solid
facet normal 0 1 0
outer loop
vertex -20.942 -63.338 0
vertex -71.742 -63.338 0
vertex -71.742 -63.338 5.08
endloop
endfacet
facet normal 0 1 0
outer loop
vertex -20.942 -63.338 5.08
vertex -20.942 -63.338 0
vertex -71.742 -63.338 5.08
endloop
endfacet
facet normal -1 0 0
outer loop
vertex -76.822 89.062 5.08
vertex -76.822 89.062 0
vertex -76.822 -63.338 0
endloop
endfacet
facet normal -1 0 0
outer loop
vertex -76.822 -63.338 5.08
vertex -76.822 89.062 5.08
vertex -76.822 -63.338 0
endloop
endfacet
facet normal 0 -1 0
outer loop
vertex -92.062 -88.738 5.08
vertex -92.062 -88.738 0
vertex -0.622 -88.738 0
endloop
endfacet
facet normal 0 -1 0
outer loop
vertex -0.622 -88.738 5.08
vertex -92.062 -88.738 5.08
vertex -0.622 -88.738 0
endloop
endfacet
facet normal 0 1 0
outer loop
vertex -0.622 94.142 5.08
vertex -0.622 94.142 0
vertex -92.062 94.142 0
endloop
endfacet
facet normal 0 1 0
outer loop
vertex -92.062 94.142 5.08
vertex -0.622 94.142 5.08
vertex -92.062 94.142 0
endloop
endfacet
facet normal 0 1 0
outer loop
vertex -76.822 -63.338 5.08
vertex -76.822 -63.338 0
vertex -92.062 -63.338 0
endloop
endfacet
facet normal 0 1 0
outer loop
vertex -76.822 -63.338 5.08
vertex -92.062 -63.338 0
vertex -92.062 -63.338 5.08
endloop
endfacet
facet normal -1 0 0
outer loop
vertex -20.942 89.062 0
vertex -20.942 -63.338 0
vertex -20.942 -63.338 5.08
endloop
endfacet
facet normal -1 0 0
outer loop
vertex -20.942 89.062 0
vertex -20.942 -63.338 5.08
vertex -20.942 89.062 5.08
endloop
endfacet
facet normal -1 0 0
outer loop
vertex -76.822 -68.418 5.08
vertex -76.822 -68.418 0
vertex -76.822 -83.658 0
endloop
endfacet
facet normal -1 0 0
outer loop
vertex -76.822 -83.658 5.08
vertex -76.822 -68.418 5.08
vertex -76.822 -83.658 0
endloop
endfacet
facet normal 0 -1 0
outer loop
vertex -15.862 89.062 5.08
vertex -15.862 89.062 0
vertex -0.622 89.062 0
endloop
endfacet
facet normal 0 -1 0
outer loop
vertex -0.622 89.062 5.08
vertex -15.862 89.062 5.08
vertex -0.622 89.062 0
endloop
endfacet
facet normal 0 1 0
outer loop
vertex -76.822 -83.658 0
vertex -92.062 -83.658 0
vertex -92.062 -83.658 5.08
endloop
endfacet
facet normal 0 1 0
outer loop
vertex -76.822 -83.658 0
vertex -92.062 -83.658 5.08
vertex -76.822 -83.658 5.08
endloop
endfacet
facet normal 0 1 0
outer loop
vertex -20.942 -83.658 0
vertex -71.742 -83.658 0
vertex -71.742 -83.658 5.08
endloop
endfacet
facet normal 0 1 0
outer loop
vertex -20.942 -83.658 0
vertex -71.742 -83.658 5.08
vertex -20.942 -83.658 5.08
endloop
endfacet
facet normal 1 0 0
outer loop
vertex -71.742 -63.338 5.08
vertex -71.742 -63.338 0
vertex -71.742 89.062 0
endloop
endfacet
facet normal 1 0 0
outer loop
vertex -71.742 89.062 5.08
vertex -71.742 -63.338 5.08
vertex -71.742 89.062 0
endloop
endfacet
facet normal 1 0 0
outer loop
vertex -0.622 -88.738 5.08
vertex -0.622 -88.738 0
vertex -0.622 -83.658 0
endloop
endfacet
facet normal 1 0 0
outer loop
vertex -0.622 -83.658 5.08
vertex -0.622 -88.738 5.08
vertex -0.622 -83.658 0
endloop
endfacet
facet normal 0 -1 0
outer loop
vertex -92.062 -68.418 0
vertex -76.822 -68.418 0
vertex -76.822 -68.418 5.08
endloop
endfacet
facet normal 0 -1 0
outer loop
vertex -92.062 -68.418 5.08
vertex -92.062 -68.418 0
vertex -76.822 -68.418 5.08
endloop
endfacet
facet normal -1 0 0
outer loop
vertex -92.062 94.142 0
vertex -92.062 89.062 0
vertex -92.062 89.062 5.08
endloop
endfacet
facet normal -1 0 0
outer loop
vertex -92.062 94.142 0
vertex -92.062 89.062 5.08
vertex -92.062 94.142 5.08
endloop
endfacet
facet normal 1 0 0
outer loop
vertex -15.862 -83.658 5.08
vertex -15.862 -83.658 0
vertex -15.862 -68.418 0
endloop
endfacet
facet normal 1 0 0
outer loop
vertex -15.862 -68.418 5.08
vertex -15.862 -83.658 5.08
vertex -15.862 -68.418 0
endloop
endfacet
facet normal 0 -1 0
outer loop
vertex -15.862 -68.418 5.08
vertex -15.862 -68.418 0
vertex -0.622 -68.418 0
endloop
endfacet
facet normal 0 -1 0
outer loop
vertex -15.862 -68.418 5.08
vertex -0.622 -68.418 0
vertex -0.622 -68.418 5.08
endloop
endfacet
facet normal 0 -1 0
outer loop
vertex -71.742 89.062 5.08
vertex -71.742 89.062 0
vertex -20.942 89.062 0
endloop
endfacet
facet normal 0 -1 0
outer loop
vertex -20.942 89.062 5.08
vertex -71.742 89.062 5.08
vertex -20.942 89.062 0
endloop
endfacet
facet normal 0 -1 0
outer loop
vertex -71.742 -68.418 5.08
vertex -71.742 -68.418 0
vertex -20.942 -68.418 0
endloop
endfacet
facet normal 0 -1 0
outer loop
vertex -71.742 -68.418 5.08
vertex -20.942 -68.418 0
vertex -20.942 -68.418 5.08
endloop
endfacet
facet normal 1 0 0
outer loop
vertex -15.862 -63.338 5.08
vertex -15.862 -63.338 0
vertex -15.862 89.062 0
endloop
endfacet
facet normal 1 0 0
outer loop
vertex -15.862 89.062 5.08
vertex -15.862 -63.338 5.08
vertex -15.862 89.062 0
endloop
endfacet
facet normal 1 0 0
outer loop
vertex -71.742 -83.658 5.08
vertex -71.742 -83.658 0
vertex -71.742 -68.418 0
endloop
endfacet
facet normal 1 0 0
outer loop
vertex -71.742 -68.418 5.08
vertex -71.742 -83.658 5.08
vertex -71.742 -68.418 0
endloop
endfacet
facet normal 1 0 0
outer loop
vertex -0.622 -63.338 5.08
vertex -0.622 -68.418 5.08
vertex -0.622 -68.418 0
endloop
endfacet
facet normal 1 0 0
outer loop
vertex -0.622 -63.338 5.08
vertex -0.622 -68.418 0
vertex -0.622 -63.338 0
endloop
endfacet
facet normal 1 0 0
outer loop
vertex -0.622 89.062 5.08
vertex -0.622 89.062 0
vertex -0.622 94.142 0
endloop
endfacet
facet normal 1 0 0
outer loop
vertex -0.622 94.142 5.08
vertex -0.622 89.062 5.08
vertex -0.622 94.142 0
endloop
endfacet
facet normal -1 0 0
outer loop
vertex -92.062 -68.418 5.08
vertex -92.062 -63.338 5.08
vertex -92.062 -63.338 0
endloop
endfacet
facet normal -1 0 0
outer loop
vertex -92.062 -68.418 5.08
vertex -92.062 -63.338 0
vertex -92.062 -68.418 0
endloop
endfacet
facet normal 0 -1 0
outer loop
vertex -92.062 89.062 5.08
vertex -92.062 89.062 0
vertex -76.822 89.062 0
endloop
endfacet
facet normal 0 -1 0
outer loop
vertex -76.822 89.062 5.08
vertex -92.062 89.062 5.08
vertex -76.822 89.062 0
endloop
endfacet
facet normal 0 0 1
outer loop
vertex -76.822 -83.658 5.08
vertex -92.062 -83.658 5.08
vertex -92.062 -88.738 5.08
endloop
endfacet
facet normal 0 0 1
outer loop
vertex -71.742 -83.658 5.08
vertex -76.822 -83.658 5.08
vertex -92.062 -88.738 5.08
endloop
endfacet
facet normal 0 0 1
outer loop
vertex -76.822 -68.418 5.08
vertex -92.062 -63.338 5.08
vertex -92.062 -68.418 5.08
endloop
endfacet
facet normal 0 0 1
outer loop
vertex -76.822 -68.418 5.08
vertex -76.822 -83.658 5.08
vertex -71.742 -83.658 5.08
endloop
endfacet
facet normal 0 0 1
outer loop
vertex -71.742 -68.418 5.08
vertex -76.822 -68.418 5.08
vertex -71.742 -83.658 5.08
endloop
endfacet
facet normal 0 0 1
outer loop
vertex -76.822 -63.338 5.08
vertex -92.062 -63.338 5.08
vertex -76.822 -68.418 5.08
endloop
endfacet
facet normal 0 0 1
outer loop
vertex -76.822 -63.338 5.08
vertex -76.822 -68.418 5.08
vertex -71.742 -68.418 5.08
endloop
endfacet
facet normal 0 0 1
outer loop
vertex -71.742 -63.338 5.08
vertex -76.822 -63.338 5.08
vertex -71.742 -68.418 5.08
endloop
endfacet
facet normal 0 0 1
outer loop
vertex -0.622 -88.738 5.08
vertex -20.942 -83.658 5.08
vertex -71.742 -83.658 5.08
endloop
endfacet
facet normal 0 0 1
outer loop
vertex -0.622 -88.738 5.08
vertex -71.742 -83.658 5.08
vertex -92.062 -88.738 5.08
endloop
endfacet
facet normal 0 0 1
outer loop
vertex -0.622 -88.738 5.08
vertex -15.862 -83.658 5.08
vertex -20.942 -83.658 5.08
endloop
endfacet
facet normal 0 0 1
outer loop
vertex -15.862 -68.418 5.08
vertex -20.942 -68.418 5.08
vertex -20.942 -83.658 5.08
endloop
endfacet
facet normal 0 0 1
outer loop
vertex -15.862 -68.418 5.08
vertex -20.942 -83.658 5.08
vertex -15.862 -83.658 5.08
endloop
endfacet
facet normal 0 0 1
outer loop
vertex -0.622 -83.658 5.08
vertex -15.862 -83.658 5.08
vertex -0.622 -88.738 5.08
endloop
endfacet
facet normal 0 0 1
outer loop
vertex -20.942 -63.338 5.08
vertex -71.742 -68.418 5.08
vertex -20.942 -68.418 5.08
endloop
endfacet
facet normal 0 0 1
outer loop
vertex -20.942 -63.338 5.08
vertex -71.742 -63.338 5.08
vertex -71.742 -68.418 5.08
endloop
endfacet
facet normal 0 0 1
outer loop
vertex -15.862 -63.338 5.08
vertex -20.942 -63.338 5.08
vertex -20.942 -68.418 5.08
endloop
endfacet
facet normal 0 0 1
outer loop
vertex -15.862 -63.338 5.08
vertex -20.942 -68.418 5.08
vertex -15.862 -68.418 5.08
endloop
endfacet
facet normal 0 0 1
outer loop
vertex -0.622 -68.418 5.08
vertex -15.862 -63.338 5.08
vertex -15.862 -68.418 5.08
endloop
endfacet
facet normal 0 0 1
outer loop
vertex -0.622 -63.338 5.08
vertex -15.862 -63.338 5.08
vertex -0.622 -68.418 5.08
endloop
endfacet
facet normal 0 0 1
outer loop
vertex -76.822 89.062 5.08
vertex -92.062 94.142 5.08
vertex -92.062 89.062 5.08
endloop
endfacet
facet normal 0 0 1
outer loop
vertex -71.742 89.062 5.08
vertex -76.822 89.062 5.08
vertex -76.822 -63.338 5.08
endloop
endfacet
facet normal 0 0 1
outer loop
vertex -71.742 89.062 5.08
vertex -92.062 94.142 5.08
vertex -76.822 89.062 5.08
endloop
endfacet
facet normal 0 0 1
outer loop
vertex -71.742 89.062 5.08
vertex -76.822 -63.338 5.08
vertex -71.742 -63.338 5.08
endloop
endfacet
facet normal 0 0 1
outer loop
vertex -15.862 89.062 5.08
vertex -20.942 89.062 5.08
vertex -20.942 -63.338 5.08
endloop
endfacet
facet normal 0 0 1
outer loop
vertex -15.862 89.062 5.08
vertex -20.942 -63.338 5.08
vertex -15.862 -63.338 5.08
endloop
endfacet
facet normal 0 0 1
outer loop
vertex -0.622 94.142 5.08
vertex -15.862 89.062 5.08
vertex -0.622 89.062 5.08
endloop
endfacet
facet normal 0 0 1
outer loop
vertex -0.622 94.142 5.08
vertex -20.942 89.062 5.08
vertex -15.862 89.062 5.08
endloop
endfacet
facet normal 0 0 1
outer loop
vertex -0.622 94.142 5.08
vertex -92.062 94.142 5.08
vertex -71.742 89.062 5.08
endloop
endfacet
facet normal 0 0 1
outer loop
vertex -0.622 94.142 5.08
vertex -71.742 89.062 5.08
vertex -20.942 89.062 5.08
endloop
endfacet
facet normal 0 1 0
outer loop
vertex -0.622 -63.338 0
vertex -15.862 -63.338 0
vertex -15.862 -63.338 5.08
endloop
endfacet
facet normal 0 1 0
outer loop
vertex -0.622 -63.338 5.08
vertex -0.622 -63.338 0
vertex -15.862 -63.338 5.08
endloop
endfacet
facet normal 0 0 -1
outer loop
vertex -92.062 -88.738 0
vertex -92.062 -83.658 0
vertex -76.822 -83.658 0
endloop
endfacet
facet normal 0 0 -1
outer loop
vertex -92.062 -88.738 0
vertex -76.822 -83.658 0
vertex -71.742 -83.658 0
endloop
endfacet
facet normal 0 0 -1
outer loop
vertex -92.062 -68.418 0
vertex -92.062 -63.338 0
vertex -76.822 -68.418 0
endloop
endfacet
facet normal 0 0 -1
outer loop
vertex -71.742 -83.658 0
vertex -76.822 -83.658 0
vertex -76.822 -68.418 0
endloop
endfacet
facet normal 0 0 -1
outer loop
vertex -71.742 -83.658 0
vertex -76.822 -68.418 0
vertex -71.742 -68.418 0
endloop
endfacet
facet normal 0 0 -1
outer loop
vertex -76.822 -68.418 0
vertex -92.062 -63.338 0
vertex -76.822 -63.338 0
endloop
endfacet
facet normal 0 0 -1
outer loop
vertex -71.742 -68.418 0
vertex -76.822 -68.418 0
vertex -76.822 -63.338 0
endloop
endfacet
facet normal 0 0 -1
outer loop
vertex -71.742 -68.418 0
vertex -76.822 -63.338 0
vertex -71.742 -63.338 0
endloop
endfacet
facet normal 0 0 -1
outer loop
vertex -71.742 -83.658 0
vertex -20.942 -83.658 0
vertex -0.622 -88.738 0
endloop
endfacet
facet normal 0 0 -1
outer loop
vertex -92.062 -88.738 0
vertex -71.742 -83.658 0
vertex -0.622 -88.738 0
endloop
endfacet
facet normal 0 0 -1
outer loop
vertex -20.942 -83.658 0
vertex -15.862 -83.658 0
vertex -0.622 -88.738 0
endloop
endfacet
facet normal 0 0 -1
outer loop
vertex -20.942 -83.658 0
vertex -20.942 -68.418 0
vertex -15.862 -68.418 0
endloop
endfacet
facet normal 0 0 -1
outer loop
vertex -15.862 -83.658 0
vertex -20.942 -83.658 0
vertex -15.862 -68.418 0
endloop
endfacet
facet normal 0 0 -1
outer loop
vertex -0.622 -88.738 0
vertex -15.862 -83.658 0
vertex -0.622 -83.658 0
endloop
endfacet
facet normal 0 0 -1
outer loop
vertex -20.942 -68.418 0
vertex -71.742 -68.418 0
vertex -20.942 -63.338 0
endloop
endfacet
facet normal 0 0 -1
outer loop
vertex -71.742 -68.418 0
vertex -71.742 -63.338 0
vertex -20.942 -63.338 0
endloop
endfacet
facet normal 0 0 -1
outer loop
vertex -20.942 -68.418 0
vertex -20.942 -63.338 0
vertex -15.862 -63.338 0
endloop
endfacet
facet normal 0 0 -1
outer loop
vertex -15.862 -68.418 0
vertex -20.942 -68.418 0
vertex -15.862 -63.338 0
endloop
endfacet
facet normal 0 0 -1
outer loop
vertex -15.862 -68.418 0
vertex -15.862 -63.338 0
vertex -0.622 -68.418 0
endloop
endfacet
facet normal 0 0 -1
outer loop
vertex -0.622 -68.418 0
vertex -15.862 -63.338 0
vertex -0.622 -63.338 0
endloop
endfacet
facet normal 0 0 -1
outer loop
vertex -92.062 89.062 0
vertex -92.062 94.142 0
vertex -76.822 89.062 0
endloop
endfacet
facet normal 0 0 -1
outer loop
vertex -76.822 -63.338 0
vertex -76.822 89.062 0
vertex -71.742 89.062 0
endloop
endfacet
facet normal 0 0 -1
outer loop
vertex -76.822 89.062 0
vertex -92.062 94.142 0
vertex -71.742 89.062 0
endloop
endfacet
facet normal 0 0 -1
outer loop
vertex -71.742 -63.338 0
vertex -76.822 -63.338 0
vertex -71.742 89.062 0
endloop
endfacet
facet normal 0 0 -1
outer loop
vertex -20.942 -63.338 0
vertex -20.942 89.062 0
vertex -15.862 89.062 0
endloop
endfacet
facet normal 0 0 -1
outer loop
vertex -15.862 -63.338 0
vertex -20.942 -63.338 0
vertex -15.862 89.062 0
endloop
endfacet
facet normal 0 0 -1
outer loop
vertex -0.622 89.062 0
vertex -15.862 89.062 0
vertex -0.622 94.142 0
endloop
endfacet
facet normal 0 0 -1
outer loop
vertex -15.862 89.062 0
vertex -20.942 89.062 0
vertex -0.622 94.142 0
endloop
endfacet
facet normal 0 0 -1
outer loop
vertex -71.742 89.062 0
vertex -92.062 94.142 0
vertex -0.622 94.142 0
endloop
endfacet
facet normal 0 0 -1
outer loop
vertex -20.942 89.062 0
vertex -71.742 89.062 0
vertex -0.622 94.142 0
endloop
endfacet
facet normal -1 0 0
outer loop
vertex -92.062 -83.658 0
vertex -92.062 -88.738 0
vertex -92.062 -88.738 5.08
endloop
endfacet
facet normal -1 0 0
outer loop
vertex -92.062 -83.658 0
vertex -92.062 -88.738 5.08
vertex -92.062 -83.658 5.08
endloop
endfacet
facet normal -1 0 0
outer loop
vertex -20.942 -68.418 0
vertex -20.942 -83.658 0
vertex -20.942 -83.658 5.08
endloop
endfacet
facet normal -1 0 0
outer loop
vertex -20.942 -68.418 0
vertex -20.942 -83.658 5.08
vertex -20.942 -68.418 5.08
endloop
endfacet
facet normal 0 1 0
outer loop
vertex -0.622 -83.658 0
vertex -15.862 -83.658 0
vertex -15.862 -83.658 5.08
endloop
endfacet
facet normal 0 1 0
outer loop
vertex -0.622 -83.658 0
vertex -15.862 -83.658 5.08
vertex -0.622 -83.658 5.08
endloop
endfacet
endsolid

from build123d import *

# Parameters (mm, degrees)
F0_W     = 5.08
F0_H     = 5.08
F0_W_2   = 15.24
F0_W_3   = 50.8
F0_H_2   = 172.72
F1_DEPTH = 5.08
F2_W     = 5.08
F2_H     = 5.08
F3_DEPTH = 50.8
F4_W     = 5.08
F4_H     = 5.08
F5_DEPTH = 15.24
F6_W     = 5.08
F6_H     = 5.08
F7_DEPTH = 15.24


with BuildPart() as f1:
    # F0 (on Top) → F1 (new body)
    with BuildSketch(Plane.XY):
        with Locations((-74.2818623495, 91.6018860722)):
            Rectangle(F0_W, F0_H)
        with Locations((-84.4418623495, 91.6018860722)):
            Rectangle(F0_W_2, F0_H)
        with Locations((-46.3418623495, 91.6018860722)):
            Rectangle(F0_W_3, F0_H)
        with Locations((-74.2818623495, 2.7018860722)):
            Rectangle(F0_W, F0_H_2)
        with Locations((-18.4018623495, 91.6018860722)):
            Rectangle(F0_W, F0_H)
        with Locations((-74.2818623495, -86.1981139278)):
            Rectangle(F0_W, F0_H)
        with Locations((-84.4418623495, -86.1981139278)):
            Rectangle(F0_W_2, F0_H)
        with Locations((-46.3418623495, -86.1981139278)):
            Rectangle(F0_W_3, F0_H)
        with Locations((-18.4018623495, 2.7018860722)):
            Rectangle(F0_W, F0_H_2)
        with Locations((-8.2418623495, 91.6018860722)):
            Rectangle(F0_W_2, F0_H)
        with Locations((-18.4018623495, -86.1981139278)):
            Rectangle(F0_W, F0_H)
        with Locations((-8.2418623495, -86.1981139278)):
            Rectangle(F0_W_2, F0_H)
    extrude(amount=F1_DEPTH)

    # F2 (on face) → F3 (join)
    with BuildSketch(Plane.YZ.offset(-71.7418623495)):
        with Locations((-65.8781139278, 2.54)):
            Rectangle(F2_W, F2_H)
    extrude(amount=F3_DEPTH)

    # F4 (on face) → F5 (join)
    with BuildSketch(Plane.YZ.offset(-15.8618623495)):
        with Locations((-65.8781139278, 2.54)):
            Rectangle(F4_W, F4_H)
    extrude(amount=F5_DEPTH)

    # F6 (on face) → F7 (join)
    with BuildSketch(Plane(origin=(-76.8218623495, 0, 0), x_dir=(0, -1, 0), z_dir=(-1, 0, 0))):
        with Locations((65.8781139278, 2.54)):
            Rectangle(F6_W, F6_H)
    extrude(amount=F7_DEPTH)


solid = f1.part
